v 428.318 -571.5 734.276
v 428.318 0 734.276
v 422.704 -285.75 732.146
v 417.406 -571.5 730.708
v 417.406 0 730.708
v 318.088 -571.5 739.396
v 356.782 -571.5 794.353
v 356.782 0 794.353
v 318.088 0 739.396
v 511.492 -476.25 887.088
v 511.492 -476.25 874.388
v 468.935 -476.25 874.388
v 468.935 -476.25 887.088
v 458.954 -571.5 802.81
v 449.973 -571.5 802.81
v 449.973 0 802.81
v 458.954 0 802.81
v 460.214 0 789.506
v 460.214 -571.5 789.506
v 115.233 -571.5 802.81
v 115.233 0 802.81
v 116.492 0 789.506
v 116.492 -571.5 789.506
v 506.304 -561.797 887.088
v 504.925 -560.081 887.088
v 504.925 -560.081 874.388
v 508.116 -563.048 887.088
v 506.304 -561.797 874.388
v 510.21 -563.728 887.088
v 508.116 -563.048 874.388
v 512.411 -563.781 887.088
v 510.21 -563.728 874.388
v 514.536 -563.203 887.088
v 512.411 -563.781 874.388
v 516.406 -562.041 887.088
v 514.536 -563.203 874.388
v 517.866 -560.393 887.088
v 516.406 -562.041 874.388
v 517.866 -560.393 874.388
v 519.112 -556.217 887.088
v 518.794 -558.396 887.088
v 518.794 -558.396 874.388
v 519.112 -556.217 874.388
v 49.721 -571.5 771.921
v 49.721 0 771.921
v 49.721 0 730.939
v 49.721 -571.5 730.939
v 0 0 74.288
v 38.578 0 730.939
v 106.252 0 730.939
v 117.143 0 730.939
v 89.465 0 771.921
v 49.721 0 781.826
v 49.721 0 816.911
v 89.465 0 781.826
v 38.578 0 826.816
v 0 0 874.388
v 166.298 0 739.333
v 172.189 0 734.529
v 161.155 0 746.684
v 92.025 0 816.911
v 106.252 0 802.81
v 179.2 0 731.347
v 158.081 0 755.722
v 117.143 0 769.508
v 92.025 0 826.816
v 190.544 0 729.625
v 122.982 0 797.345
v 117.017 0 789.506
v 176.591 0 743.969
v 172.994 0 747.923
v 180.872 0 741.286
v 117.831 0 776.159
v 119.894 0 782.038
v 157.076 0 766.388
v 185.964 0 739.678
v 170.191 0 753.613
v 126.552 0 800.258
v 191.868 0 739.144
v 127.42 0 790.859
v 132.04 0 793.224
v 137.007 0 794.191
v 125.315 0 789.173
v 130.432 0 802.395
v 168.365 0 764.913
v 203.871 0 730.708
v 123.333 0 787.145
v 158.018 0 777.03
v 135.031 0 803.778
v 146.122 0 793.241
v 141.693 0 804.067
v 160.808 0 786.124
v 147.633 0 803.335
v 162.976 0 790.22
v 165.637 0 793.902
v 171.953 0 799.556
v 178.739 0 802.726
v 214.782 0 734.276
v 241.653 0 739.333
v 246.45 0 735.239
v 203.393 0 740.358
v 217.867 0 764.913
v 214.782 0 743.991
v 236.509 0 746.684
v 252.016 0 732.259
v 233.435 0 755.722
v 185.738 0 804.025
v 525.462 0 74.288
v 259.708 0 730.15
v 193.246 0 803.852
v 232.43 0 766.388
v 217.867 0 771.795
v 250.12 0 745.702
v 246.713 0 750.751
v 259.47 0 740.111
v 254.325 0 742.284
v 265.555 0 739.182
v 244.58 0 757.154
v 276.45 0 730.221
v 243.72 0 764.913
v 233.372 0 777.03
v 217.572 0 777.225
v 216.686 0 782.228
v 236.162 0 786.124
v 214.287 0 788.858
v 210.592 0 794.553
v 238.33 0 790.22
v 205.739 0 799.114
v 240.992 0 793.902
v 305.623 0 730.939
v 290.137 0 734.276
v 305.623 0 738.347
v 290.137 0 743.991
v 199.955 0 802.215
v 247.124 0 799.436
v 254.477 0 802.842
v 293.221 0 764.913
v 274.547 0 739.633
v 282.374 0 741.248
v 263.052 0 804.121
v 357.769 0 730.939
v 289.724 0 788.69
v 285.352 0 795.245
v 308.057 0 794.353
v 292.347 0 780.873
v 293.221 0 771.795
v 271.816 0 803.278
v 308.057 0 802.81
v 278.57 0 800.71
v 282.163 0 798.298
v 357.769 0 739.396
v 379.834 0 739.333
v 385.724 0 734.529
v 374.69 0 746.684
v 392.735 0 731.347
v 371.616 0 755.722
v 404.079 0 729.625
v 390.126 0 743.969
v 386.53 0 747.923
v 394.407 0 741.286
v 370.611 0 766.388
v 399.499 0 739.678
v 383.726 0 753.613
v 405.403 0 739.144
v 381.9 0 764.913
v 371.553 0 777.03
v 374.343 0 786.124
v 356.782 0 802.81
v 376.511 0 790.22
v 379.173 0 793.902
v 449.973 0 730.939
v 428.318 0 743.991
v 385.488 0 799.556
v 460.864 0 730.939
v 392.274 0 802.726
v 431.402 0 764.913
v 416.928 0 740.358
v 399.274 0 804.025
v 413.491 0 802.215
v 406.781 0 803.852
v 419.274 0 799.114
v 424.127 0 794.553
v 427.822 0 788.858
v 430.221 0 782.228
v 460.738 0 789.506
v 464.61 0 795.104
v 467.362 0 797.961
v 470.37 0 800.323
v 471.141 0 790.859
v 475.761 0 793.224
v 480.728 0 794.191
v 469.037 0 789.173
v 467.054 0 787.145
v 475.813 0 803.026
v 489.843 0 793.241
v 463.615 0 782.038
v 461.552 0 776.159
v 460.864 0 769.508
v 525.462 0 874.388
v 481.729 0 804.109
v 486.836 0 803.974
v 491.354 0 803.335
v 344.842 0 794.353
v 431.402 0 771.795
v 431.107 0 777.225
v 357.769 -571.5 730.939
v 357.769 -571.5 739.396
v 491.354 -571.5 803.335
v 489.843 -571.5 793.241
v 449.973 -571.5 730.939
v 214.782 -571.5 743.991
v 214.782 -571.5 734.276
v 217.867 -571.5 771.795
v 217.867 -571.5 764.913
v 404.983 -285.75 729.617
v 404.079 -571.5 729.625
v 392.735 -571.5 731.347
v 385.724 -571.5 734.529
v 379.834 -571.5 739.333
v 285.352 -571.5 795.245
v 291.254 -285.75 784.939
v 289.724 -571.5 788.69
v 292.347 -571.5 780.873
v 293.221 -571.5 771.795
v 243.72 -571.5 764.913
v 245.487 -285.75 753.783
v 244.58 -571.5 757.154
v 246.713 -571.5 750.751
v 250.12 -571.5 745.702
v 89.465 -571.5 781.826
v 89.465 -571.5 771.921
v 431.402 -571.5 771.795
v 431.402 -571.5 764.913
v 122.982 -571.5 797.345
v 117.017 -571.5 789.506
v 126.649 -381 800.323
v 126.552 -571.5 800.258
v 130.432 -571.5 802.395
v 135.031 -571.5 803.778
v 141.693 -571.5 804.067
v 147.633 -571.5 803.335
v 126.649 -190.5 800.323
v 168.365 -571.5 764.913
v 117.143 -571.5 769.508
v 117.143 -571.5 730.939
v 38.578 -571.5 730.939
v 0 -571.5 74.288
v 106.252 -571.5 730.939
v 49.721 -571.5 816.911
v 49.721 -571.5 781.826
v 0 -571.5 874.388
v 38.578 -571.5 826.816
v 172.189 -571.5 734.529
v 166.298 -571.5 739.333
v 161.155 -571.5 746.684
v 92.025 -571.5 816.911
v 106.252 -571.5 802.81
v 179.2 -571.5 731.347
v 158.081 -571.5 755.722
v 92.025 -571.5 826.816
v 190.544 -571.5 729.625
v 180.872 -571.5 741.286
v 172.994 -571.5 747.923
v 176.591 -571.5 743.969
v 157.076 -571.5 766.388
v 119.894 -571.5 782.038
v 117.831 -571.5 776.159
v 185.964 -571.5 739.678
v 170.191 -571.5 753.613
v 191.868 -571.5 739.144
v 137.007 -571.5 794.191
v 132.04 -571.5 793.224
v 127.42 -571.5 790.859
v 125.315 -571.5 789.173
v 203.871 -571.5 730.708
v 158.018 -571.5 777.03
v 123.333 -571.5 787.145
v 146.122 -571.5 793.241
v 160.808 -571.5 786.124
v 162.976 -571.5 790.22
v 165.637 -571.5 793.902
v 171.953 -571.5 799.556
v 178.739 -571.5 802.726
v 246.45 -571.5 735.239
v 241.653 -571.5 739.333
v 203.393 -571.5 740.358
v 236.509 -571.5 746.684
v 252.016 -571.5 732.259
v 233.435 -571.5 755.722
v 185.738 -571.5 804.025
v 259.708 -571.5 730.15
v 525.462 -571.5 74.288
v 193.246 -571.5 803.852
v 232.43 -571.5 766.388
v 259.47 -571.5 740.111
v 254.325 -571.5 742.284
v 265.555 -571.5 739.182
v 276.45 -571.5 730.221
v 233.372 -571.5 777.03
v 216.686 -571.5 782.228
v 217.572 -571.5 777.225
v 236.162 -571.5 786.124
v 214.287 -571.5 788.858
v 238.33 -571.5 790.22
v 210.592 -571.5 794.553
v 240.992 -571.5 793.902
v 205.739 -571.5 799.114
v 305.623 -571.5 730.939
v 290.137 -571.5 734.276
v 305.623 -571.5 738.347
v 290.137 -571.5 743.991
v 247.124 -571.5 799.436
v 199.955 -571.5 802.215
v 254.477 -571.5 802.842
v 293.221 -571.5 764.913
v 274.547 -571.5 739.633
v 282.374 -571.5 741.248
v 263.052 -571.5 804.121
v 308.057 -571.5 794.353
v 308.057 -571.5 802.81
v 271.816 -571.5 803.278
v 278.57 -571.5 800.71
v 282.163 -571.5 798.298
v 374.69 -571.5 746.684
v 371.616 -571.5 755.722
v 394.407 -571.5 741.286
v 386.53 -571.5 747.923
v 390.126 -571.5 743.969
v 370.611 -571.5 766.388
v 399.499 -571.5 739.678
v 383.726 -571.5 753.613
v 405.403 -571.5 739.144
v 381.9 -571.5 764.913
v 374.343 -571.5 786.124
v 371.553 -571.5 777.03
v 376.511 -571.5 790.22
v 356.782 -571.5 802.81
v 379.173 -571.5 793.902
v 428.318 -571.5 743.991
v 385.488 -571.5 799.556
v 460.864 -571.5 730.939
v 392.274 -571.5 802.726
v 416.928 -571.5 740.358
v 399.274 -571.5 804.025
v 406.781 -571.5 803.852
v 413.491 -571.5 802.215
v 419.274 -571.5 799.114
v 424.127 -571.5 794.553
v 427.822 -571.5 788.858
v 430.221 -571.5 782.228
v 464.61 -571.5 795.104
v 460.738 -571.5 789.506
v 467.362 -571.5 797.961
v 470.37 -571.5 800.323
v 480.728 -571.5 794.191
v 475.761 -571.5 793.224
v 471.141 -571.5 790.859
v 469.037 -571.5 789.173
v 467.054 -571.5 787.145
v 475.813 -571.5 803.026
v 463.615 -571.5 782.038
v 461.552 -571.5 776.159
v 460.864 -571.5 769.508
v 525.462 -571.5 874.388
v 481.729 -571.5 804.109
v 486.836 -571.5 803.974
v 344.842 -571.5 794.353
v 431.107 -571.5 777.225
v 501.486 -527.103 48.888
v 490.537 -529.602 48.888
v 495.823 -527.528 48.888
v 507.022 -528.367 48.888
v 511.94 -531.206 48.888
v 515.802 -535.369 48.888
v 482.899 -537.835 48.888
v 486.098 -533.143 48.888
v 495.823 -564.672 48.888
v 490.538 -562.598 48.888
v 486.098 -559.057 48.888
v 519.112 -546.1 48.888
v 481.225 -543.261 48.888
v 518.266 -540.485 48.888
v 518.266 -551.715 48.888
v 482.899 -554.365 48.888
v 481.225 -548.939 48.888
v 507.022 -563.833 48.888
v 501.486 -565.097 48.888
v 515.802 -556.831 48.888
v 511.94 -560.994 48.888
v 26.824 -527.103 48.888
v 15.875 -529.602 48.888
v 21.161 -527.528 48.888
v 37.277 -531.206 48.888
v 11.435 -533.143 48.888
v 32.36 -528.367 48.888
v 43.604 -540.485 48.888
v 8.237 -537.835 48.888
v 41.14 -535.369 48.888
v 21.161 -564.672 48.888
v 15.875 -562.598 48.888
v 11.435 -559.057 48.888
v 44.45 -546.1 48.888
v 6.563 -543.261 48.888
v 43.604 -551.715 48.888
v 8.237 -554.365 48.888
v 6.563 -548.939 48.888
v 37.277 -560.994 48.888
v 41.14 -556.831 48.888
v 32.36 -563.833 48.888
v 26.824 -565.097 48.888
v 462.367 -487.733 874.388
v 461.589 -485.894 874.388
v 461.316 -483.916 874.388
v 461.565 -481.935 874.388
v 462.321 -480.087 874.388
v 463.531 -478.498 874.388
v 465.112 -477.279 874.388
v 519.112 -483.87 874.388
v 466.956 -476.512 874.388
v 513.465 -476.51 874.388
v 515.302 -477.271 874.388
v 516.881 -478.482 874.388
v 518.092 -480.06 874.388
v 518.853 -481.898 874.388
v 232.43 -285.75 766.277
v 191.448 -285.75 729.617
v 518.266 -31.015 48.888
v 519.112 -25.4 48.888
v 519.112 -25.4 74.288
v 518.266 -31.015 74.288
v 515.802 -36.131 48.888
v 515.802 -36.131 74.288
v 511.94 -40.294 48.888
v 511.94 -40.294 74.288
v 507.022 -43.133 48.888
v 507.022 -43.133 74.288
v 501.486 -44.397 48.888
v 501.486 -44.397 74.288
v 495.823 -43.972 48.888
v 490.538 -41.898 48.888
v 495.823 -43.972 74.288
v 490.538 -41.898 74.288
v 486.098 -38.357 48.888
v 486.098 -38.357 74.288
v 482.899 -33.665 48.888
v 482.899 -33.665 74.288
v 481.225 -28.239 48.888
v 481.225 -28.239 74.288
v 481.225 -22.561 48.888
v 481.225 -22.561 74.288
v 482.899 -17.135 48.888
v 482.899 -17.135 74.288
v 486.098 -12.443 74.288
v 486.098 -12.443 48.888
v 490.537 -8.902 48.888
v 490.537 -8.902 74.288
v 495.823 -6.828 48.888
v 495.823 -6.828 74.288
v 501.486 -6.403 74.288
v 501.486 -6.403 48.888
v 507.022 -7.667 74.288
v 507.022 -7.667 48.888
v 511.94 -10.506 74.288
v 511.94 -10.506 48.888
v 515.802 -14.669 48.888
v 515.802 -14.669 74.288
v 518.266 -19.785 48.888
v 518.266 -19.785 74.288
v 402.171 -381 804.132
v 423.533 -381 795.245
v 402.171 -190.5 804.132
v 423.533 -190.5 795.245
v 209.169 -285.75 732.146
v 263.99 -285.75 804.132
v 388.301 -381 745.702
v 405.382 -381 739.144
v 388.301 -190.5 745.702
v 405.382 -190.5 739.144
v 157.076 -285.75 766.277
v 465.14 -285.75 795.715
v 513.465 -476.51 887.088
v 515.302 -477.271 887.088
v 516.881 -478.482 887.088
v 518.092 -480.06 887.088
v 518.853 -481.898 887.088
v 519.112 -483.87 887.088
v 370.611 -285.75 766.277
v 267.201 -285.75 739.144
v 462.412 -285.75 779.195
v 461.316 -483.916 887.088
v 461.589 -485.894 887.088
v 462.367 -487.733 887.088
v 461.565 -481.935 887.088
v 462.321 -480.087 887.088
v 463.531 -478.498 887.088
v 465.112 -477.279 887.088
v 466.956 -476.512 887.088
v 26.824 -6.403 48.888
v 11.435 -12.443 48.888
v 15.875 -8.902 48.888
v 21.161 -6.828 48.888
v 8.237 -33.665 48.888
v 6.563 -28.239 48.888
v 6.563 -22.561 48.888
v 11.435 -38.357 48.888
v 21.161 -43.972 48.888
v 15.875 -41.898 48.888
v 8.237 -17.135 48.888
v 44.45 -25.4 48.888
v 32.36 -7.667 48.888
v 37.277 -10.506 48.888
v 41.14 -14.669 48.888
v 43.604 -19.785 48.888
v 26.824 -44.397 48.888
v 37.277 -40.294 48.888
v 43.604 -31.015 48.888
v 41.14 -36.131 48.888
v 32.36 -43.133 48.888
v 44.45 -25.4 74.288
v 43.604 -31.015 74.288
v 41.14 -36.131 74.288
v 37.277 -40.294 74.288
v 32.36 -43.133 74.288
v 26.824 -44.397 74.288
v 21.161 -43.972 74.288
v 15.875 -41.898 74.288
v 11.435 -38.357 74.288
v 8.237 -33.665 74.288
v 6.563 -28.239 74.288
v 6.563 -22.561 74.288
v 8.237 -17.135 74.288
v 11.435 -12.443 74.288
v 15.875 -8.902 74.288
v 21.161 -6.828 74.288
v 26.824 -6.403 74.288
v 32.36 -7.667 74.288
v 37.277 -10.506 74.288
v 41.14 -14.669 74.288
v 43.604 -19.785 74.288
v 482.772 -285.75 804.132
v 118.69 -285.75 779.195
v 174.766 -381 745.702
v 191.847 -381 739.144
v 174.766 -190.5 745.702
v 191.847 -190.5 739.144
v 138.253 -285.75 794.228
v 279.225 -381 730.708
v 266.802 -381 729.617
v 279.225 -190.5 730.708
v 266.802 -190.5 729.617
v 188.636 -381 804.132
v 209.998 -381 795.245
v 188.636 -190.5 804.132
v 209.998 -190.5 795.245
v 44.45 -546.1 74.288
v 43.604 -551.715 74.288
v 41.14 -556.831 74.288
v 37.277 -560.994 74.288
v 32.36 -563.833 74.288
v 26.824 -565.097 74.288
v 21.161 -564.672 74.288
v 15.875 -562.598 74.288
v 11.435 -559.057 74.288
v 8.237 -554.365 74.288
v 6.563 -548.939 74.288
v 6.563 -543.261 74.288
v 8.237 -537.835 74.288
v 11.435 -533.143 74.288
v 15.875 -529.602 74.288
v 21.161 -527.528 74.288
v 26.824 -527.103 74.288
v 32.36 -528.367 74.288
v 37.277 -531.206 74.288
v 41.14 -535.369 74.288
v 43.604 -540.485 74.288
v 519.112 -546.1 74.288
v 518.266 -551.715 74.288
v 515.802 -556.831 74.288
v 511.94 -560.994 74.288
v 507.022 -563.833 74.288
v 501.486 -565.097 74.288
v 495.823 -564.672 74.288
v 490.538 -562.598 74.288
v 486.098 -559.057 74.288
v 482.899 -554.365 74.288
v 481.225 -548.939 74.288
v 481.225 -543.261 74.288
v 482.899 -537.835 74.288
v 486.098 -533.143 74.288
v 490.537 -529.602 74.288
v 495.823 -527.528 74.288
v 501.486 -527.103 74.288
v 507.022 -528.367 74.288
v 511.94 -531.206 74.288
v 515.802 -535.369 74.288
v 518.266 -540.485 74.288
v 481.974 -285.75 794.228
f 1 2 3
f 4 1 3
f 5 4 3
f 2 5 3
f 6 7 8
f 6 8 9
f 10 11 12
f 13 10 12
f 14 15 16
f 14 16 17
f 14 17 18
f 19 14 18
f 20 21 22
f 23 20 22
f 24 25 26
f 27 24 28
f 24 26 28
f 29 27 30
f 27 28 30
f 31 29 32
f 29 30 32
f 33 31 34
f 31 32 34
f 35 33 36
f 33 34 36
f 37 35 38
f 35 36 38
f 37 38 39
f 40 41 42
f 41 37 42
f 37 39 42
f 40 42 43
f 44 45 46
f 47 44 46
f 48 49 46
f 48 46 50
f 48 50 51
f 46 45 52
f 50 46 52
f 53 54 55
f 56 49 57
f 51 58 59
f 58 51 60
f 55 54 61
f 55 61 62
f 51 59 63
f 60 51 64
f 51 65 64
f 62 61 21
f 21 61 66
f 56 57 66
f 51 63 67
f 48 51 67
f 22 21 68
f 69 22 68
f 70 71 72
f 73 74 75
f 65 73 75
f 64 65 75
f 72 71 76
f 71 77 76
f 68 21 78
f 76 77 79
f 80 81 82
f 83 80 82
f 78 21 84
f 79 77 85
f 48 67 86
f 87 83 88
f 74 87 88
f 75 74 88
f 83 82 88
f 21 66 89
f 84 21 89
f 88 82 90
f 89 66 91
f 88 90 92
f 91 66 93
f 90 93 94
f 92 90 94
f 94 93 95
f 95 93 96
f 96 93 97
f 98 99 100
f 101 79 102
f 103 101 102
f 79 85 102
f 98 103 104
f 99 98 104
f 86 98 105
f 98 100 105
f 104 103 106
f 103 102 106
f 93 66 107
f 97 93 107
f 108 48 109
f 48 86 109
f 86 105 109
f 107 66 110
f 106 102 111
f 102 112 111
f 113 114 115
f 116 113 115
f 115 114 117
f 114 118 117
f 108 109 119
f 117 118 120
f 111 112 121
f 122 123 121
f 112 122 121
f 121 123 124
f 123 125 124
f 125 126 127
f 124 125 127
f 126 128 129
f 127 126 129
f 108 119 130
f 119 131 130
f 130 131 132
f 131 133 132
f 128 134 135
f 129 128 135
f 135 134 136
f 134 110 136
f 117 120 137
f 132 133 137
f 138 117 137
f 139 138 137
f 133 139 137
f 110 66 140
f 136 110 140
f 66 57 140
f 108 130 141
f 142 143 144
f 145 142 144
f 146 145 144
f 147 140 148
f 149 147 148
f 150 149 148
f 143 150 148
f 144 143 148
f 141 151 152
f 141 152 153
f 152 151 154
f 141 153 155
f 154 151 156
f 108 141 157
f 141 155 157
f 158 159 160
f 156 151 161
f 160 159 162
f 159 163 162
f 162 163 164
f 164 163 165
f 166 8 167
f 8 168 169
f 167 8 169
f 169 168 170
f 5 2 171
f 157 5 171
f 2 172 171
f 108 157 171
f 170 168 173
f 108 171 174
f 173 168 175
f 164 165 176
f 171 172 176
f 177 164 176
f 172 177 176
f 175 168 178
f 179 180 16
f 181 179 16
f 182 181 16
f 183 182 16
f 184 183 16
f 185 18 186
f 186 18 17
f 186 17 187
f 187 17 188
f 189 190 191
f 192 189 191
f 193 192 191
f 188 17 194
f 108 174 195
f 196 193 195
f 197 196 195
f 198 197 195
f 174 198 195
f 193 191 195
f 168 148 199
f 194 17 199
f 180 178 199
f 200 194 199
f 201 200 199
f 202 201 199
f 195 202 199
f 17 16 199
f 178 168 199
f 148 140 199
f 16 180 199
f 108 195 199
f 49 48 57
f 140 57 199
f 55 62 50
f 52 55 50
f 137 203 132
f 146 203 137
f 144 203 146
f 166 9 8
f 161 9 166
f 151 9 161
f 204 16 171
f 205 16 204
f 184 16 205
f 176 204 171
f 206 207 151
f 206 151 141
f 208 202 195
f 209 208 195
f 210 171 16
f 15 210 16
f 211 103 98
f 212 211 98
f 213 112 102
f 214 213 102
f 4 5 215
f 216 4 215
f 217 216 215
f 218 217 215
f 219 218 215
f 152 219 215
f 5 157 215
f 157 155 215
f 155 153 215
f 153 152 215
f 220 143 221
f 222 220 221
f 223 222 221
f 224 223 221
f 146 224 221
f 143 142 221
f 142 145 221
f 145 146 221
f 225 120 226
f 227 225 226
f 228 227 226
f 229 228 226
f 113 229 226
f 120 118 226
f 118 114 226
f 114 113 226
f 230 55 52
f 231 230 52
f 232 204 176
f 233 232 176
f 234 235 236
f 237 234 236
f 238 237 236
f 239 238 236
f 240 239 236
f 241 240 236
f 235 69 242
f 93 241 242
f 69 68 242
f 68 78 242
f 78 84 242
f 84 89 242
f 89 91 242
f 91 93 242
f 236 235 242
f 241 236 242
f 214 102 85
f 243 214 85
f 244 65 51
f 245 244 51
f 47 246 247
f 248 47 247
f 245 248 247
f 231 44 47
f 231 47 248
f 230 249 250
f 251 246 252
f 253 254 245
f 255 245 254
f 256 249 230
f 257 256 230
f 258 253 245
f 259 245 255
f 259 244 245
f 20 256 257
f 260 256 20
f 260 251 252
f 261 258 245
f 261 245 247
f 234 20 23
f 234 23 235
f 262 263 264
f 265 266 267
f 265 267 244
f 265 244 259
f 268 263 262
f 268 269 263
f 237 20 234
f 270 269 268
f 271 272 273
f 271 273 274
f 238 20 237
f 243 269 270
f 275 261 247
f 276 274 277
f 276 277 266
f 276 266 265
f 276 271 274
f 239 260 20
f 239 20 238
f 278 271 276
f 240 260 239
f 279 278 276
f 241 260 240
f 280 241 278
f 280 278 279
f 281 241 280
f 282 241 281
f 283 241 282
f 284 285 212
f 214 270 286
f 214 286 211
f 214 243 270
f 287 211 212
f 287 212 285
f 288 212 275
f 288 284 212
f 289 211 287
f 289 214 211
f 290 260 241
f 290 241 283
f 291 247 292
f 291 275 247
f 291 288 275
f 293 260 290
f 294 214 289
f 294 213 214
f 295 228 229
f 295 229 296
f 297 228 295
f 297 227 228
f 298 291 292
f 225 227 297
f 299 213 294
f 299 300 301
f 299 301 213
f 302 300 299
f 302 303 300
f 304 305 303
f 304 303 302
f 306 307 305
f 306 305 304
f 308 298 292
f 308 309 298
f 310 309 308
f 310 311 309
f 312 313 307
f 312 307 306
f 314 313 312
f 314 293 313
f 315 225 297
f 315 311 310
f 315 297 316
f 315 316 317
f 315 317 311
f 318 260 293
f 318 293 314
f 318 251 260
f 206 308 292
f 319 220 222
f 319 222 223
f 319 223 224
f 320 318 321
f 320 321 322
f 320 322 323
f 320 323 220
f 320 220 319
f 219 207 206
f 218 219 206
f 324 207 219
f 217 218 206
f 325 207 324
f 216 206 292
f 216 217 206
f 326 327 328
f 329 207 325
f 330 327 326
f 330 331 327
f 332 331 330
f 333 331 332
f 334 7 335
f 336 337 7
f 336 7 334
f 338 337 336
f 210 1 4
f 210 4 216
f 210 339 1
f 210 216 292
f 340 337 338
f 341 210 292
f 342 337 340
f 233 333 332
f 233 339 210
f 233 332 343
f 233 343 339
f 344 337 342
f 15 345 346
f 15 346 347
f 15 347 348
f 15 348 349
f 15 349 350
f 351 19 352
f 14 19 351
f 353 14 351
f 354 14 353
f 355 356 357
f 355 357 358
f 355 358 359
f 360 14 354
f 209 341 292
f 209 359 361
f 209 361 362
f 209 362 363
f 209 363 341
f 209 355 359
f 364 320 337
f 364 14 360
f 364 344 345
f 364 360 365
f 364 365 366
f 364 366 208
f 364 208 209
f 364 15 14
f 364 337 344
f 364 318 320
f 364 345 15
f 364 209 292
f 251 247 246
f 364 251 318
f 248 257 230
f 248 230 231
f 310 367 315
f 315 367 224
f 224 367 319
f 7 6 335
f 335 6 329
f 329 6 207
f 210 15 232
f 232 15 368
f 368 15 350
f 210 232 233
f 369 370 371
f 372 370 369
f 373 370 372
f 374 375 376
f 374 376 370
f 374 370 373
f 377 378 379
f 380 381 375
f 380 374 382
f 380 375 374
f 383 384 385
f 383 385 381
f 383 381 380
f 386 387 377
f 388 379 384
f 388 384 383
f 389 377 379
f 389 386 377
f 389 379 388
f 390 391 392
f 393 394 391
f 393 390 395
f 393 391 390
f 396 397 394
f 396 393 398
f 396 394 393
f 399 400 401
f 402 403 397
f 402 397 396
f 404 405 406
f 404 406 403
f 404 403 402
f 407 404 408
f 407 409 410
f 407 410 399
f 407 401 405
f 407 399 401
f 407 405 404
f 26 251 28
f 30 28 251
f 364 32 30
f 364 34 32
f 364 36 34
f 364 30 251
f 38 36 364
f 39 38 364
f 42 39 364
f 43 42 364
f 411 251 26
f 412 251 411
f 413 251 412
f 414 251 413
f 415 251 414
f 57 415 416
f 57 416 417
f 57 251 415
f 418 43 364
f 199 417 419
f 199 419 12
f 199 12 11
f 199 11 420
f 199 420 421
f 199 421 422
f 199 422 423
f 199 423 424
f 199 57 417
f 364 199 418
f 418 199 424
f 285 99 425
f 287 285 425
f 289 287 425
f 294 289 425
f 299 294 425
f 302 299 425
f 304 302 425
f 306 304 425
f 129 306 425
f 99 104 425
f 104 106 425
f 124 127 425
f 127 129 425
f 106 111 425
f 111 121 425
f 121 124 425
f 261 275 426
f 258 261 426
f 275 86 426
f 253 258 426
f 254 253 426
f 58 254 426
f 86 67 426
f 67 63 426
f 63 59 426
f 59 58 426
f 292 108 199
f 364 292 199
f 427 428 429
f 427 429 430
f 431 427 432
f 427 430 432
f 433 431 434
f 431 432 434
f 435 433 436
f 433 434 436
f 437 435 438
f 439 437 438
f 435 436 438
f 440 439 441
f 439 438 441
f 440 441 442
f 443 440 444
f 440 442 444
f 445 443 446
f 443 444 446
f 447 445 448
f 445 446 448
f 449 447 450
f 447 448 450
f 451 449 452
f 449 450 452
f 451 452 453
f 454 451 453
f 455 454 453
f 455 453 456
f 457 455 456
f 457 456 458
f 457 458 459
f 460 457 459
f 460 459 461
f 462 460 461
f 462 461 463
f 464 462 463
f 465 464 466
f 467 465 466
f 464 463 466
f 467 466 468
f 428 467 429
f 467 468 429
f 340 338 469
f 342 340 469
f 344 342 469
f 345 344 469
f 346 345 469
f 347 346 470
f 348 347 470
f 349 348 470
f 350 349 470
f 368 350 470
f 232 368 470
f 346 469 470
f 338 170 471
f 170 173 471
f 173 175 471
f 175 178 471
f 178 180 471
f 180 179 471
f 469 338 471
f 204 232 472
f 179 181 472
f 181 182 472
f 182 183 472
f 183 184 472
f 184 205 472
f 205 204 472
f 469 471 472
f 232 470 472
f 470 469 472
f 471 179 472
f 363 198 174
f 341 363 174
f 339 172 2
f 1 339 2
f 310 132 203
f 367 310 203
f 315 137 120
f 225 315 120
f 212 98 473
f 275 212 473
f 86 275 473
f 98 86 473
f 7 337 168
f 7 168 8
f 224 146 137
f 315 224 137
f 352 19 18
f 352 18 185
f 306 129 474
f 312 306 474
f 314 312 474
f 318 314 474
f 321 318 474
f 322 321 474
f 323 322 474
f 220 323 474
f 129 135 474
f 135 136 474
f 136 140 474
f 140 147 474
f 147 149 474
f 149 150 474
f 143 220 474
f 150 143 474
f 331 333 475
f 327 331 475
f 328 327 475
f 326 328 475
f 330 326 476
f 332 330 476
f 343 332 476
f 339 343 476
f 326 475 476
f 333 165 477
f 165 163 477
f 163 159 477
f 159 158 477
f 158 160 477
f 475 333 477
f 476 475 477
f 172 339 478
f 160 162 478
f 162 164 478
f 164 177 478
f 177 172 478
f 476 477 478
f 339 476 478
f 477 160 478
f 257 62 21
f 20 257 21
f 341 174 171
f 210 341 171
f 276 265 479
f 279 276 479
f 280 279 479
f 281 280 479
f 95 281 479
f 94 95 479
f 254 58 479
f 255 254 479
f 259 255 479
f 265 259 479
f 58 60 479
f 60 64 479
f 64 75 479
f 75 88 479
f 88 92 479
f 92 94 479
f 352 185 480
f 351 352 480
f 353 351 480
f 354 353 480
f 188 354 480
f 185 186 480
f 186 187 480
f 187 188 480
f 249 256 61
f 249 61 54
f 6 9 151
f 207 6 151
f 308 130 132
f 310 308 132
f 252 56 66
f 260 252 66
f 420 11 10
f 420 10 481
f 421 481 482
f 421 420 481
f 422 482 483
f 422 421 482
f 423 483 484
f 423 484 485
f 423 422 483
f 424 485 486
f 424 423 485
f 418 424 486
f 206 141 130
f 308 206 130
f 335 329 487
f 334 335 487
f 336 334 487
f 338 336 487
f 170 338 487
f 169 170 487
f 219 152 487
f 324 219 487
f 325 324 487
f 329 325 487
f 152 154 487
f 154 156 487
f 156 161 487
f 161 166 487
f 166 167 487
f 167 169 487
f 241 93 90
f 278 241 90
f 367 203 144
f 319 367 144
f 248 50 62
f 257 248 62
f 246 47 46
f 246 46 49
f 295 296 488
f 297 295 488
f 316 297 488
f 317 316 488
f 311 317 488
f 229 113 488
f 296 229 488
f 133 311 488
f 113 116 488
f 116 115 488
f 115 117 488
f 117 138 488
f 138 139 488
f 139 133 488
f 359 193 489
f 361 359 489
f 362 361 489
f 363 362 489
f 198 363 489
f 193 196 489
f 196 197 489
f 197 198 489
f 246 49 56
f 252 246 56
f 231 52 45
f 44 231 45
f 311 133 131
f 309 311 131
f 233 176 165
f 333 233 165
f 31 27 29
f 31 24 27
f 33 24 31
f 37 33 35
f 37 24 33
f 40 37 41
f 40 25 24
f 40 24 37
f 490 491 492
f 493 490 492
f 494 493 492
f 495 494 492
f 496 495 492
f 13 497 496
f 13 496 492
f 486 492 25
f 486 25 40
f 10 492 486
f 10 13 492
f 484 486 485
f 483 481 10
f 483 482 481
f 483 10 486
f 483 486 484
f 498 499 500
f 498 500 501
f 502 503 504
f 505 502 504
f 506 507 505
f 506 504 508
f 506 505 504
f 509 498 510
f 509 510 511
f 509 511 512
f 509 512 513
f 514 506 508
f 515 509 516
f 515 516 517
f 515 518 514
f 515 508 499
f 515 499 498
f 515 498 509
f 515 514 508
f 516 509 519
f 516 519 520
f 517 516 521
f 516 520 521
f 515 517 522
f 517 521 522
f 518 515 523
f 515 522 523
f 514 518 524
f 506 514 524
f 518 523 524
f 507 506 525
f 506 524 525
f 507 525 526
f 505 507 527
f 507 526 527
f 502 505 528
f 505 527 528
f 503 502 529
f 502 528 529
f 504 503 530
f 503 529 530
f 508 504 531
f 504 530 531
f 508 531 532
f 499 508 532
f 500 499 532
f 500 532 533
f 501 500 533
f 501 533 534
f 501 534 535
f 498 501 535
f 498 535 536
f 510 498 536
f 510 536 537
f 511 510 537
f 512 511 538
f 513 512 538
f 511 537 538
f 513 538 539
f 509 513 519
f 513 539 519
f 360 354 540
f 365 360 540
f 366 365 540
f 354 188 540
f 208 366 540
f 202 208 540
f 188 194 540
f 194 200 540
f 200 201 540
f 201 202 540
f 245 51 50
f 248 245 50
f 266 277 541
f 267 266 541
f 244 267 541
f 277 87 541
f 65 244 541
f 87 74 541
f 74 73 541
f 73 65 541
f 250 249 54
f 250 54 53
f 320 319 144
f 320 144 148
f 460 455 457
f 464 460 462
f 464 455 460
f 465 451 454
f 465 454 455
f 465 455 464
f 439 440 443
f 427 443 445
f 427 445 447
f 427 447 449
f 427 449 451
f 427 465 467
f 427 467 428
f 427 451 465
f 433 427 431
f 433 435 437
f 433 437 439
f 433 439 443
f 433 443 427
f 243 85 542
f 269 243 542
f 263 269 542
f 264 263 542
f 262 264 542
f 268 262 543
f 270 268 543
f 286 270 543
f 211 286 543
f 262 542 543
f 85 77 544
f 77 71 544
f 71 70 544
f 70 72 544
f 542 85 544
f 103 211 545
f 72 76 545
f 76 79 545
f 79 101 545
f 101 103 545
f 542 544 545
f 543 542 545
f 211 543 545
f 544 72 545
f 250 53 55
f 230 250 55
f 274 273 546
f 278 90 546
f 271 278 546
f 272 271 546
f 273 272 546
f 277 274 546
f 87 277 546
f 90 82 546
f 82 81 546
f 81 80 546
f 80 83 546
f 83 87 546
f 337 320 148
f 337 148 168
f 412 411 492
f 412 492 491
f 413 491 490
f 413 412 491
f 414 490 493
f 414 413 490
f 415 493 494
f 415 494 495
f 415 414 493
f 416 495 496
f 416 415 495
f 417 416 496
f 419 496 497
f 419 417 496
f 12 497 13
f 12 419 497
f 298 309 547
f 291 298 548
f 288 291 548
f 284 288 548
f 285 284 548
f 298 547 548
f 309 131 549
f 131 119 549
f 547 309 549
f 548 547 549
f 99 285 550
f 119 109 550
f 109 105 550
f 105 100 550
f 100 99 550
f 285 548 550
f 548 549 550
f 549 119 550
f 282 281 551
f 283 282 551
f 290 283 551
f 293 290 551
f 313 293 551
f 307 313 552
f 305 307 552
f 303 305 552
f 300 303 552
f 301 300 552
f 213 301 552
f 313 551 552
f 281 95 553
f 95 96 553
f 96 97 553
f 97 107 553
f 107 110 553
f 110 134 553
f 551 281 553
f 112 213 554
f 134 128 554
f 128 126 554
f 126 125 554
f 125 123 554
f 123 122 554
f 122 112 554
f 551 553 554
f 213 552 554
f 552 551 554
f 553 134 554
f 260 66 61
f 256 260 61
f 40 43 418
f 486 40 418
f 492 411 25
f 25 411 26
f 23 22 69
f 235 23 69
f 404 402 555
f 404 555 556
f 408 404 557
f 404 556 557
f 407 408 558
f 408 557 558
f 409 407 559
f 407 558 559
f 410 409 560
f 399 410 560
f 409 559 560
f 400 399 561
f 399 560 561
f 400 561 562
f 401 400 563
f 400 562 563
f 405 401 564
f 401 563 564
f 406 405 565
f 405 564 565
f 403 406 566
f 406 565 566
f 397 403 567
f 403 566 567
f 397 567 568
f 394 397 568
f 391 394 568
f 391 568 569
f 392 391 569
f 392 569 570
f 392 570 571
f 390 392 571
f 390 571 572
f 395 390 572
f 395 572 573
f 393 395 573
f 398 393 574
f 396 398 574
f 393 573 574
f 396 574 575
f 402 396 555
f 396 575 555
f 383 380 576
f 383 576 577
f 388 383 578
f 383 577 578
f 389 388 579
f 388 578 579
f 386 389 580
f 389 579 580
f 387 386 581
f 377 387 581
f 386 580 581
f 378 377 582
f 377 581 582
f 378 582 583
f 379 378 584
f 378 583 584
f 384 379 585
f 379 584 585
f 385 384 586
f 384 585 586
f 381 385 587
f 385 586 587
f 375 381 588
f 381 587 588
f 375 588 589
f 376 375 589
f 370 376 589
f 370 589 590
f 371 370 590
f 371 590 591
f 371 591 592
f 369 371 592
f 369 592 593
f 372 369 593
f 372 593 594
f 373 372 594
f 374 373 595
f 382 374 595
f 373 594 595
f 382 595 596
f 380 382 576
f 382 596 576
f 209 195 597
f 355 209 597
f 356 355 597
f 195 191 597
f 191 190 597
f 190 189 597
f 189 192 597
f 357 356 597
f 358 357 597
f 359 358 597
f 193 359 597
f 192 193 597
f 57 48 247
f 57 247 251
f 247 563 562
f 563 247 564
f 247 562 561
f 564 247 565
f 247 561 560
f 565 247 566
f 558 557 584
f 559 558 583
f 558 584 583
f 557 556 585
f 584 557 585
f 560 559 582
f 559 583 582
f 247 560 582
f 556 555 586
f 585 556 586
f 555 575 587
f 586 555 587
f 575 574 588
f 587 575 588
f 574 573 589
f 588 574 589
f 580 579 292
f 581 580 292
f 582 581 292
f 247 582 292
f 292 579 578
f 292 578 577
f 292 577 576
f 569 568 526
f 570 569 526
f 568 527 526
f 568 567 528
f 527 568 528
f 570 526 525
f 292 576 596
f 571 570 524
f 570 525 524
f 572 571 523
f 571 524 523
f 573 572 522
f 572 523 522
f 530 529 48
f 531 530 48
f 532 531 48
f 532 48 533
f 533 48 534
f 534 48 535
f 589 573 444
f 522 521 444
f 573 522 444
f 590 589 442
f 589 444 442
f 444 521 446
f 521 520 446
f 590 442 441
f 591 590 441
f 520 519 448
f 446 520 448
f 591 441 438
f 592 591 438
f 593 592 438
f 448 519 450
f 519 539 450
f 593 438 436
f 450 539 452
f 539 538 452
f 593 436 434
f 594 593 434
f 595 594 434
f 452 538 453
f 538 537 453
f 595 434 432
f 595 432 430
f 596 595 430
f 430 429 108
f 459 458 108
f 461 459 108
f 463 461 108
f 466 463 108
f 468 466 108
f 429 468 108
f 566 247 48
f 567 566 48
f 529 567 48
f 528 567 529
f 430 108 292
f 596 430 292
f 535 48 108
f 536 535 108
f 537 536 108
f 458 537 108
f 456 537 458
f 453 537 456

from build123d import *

# Parameters (mm, degrees)
F0_W        = 525.4625
F0_H        = 800.1
F1_DEPTH    = 571.5
F2_R        = 19.05
F3_DEPTH    = 25.4
F5_DEPTH    = 12.7
F6_T1_DEPTH = 82.6574729689
F6_T3_DEPTH = 31.75
F6_T5_DEPTH = 46.0073370405


# Not quite as in the source:
# - a fillet or chamfer that OpenCascade refuses, or shapes differently, is made with other operations: its cross-section is extruded or revolved along the edge and cut away or added


with BuildPart() as f1:
    # F0 (on Front) → F1 (new body)
    with BuildSketch(Plane.XZ):
        with Locations((262.73125, 474.3377777734)):
            Rectangle(F0_W, F0_H)
        with BuildLine():
            add(Edge.make_bspline(
                [(126.6487428161, 800.3234279035), (132.2934913793, 804.132059369), (139.0504022989, 804.132059369)],
                knots=[0, 0, 0, 1, 1, 1], degree=2))
            add(Edge.make_bspline(
                [(139.0504022989, 804.132059369), (143.8347988506, 804.132059369), (147.6329382184, 803.3346599437)],
                knots=[0, 0, 0, 1, 1, 1], degree=2))
            Line((147.6329382184, 803.3346599437), (146.1220761494, 793.2412619552))
            add(Edge.make_bspline(
                [(146.1220761494, 793.2412619552), (141.6734267241, 794.2275191391), (138.2530028736, 794.2275191391)],
                knots=[0, 0, 0, 1, 1, 1], degree=2))
            add(Edge.make_bspline(
                [(138.2530028736, 794.2275191391), (129.5235775862, 794.2275191391), (123.3332399425, 787.1453531909)],
                knots=[0, 0, 0, 1, 1, 1], degree=2))
            add(Edge.make_bspline(
                [(123.3332399425, 787.1453531909), (117.1429022989, 780.0631872426), (117.1429022989, 769.5081369552)],
                knots=[0, 0, 0, 1, 1, 1], degree=2))
            Line((117.1429022989, 769.5081369552), (117.1429022989, 730.9391858058))
            Line((117.1429022989, 730.9391858058), (106.2521048851, 730.9391858058))
            Line((106.2521048851, 730.9391858058), (106.2521048851, 802.8100550587))
            Line((106.2521048851, 802.8100550587), (115.2333405172, 802.8100550587))
            Line((115.2333405172, 802.8100550587), (116.4923922414, 789.5060751736))
            Line((116.4923922414, 789.5060751736), (117.0169971264, 789.5060751736))
            add(Edge.make_bspline(
                [(117.0169971264, 789.5060751736), (121.0039942529, 796.514796438), (126.6487428161, 800.3234279035)],
                knots=[0, 0, 0, 1, 1, 1], degree=2))
        make_face(mode=Mode.SUBTRACT)
        Polygon((49.7206824713, 771.9213194265), (49.7206824713, 730.9391858058), (38.5780747126, 730.9391858058), (38.5780747126, 826.8159745989), (92.0248204023, 826.8159745989), (92.0248204023, 816.911434369), (49.7206824713, 816.911434369), (49.7206824713, 781.8258596564), (89.4647485632, 781.8258596564), (89.4647485632, 771.9213194265), align=None, mode=Mode.SUBTRACT)
        with BuildLine():
            add(Edge.make_bspline(
                [(203.8705818966, 730.7083596564), (198.729454023, 729.6171814955), (191.4479382184, 729.6171814955)],
                knots=[0, 0, 0, 1, 1, 1], degree=2))
            add(Edge.make_bspline(
                [(191.4479382184, 729.6171814955), (175.520933908, 729.6171814955), (166.2983800287, 739.3328639667)],
                knots=[0, 0, 0, 1, 1, 1], degree=2))
            add(Edge.make_bspline(
                [(166.2983800287, 739.3328639667), (157.0758261494, 749.048546438), (157.0758261494, 766.2765708633)],
                knots=[0, 0, 0, 1, 1, 1], degree=2))
            add(Edge.make_bspline(
                [(157.0758261494, 766.2765708633), (157.0758261494, 783.6724688518), (165.6373778736, 793.9022641104)],
                knots=[0, 0, 0, 1, 1, 1], degree=2))
            add(Edge.make_bspline(
                [(165.6373778736, 793.9022641104), (174.1989295977, 804.132059369), (188.6360560345, 804.132059369)],
                knots=[0, 0, 0, 1, 1, 1], degree=2))
            add(Edge.make_bspline(
                [(188.6360560345, 804.132059369), (202.1288936782, 804.132059369), (209.997966954, 795.2452526162)],
                knots=[0, 0, 0, 1, 1, 1], degree=2))
            add(Edge.make_bspline(
                [(209.997966954, 795.2452526162), (217.8670402299, 786.3584458633), (217.8670402299, 771.7954142541)],
                knots=[0, 0, 0, 1, 1, 1], degree=2))
            Line((217.8670402299, 771.7954142541), (217.8670402299, 764.9125981621))
            Line((217.8670402299, 764.9125981621), (168.3653232759, 764.9125981621))
            add(Edge.make_bspline(
                [(168.3653232759, 764.9125981621), (168.7010704023, 752.2591283346), (174.7655028736, 745.7015672713)],
                knots=[0, 0, 0, 1, 1, 1], degree=2))
            add(Edge.make_bspline(
                [(174.7655028736, 745.7015672713), (180.8299353448, 739.1440062081), (191.846637931, 739.1440062081)],
                knots=[0, 0, 0, 1, 1, 1], degree=2))
            add(Edge.make_bspline(
                [(191.846637931, 739.1440062081), (203.4508979885, 739.1440062081), (214.7823635057, 743.991355346)],
                knots=[0, 0, 0, 1, 1, 1], degree=2))
            Line((214.7823635057, 743.991355346), (214.7823635057, 734.2756728748))
            add(Edge.make_bspline(
                [(214.7823635057, 734.2756728748), (209.0117097701, 731.7995378173), (203.8705818966, 730.7083596564)],
                knots=[0, 0, 0, 1, 1, 1], degree=2))
        make_face(mode=Mode.SUBTRACT)
        with BuildLine():
            add(Edge.make_bspline(
                [(279.2248275862, 730.7083596564), (274.0836997126, 729.6171814955), (266.802183908, 729.6171814955)],
                knots=[0, 0, 0, 1, 1, 1], degree=2))
            add(Edge.make_bspline(
                [(266.802183908, 729.6171814955), (250.8751795977, 729.6171814955), (241.6526257184, 739.3328639667)],
                knots=[0, 0, 0, 1, 1, 1], degree=2))
            add(Edge.make_bspline(
                [(241.6526257184, 739.3328639667), (232.4300718391, 749.048546438), (232.4300718391, 766.2765708633)],
                knots=[0, 0, 0, 1, 1, 1], degree=2))
            add(Edge.make_bspline(
                [(232.4300718391, 766.2765708633), (232.4300718391, 783.6724688518), (240.9916235632, 793.9022641104)],
                knots=[0, 0, 0, 1, 1, 1], degree=2))
            add(Edge.make_bspline(
                [(240.9916235632, 793.9022641104), (249.5531752874, 804.132059369), (263.9903017241, 804.132059369)],
                knots=[0, 0, 0, 1, 1, 1], degree=2))
            add(Edge.make_bspline(
                [(263.9903017241, 804.132059369), (277.4831393678, 804.132059369), (285.3522126437, 795.2452526162)],
                knots=[0, 0, 0, 1, 1, 1], degree=2))
            add(Edge.make_bspline(
                [(285.3522126437, 795.2452526162), (293.2212859195, 786.3584458633), (293.2212859195, 771.7954142541)],
                knots=[0, 0, 0, 1, 1, 1], degree=2))
            Line((293.2212859195, 771.7954142541), (293.2212859195, 764.9125981621))
            Line((293.2212859195, 764.9125981621), (243.7195689655, 764.9125981621))
            add(Edge.make_bspline(
                [(243.7195689655, 764.9125981621), (244.055316092, 752.2591283346), (250.1197485632, 745.7015672713)],
                knots=[0, 0, 0, 1, 1, 1], degree=2))
            add(Edge.make_bspline(
                [(250.1197485632, 745.7015672713), (256.1841810345, 739.1440062081), (267.2008836207, 739.1440062081)],
                knots=[0, 0, 0, 1, 1, 1], degree=2))
            add(Edge.make_bspline(
                [(267.2008836207, 739.1440062081), (278.8051436782, 739.1440062081), (290.1366091954, 743.991355346)],
                knots=[0, 0, 0, 1, 1, 1], degree=2))
            Line((290.1366091954, 743.991355346), (290.1366091954, 734.2756728748))
            add(Edge.make_bspline(
                [(290.1366091954, 734.2756728748), (284.3659554598, 731.7995378173), (279.2248275862, 730.7083596564)],
                knots=[0, 0, 0, 1, 1, 1], degree=2))
        make_face(mode=Mode.SUBTRACT)
        Polygon((357.768670977, 739.3958165529), (357.768670977, 730.9391858058), (305.6229454023, 730.9391858058), (305.6229454023, 738.3466067828), (344.8424066092, 794.3534243116), (308.057112069, 794.3534243116), (308.057112069, 802.8100550587), (356.7824137931, 802.8100550587), (356.7824137931, 794.3534243116), (318.0875574713, 739.3958165529), align=None, mode=Mode.SUBTRACT)
        with BuildLine():
            add(Edge.make_bspline(
                [(417.4057543103, 730.7083596564), (412.2646264368, 729.6171814955), (404.9831106322, 729.6171814955)],
                knots=[0, 0, 0, 1, 1, 1], degree=2))
            add(Edge.make_bspline(
                [(404.9831106322, 729.6171814955), (389.0561063218, 729.6171814955), (379.8335524425, 739.3328639667)],
                knots=[0, 0, 0, 1, 1, 1], degree=2))
            add(Edge.make_bspline(
                [(379.8335524425, 739.3328639667), (370.6109985632, 749.048546438), (370.6109985632, 766.2765708633)],
                knots=[0, 0, 0, 1, 1, 1], degree=2))
            add(Edge.make_bspline(
                [(370.6109985632, 766.2765708633), (370.6109985632, 783.6724688518), (379.1725502874, 793.9022641104)],
                knots=[0, 0, 0, 1, 1, 1], degree=2))
            add(Edge.make_bspline(
                [(379.1725502874, 793.9022641104), (387.7341020115, 804.132059369), (402.1712284483, 804.132059369)],
                knots=[0, 0, 0, 1, 1, 1], degree=2))
            add(Edge.make_bspline(
                [(402.1712284483, 804.132059369), (415.664066092, 804.132059369), (423.5331393678, 795.2452526162)],
                knots=[0, 0, 0, 1, 1, 1], degree=2))
            add(Edge.make_bspline(
                [(423.5331393678, 795.2452526162), (431.4022126437, 786.3584458633), (431.4022126437, 771.7954142541)],
                knots=[0, 0, 0, 1, 1, 1], degree=2))
            Line((431.4022126437, 771.7954142541), (431.4022126437, 764.9125981621))
            Line((431.4022126437, 764.9125981621), (381.9004956897, 764.9125981621))
            add(Edge.make_bspline(
                [(381.9004956897, 764.9125981621), (382.2362428161, 752.2591283346), (388.3006752874, 745.7015672713)],
                knots=[0, 0, 0, 1, 1, 1], degree=2))
            add(Edge.make_bspline(
                [(388.3006752874, 745.7015672713), (394.3651077586, 739.1440062081), (405.3818103448, 739.1440062081)],
                knots=[0, 0, 0, 1, 1, 1], degree=2))
            add(Edge.make_bspline(
                [(405.3818103448, 739.1440062081), (416.9860704023, 739.1440062081), (428.3175359195, 743.991355346)],
                knots=[0, 0, 0, 1, 1, 1], degree=2))
            Line((428.3175359195, 743.991355346), (428.3175359195, 734.2756728748))
            add(Edge.make_bspline(
                [(428.3175359195, 734.2756728748), (422.5468821839, 731.7995378173), (417.4057543103, 730.7083596564)],
                knots=[0, 0, 0, 1, 1, 1], degree=2))
        make_face(mode=Mode.SUBTRACT)
        with BuildLine():
            add(Edge.make_bspline(
                [(470.3698635057, 800.3234279035), (476.014612069, 804.132059369), (482.7715229885, 804.132059369)],
                knots=[0, 0, 0, 1, 1, 1], degree=2))
            add(Edge.make_bspline(
                [(482.7715229885, 804.132059369), (487.5559195402, 804.132059369), (491.354058908, 803.3346599437)],
                knots=[0, 0, 0, 1, 1, 1], degree=2))
            Line((491.354058908, 803.3346599437), (489.8431968391, 793.2412619552))
            add(Edge.make_bspline(
                [(489.8431968391, 793.2412619552), (485.3945474138, 794.2275191391), (481.9741235632, 794.2275191391)],
                knots=[0, 0, 0, 1, 1, 1], degree=2))
            add(Edge.make_bspline(
                [(481.9741235632, 794.2275191391), (473.2446982759, 794.2275191391), (467.0543606322, 787.1453531909)],
                knots=[0, 0, 0, 1, 1, 1], degree=2))
            add(Edge.make_bspline(
                [(467.0543606322, 787.1453531909), (460.8640229885, 780.0631872426), (460.8640229885, 769.5081369552)],
                knots=[0, 0, 0, 1, 1, 1], degree=2))
            Line((460.8640229885, 769.5081369552), (460.8640229885, 730.9391858058))
            Line((460.8640229885, 730.9391858058), (449.9732255747, 730.9391858058))
            Line((449.9732255747, 730.9391858058), (449.9732255747, 802.8100550587))
            Line((449.9732255747, 802.8100550587), (458.9544612069, 802.8100550587))
            Line((458.9544612069, 802.8100550587), (460.213512931, 789.5060751736))
            Line((460.213512931, 789.5060751736), (460.7381178161, 789.5060751736))
            add(Edge.make_bspline(
                [(460.7381178161, 789.5060751736), (464.7251149425, 796.514796438), (470.3698635057, 800.3234279035)],
                knots=[0, 0, 0, 1, 1, 1], degree=2))
        make_face(mode=Mode.SUBTRACT)
    extrude(amount=F1_DEPTH)

    # F2 (on face) → F3 (join)
    with BuildSketch(Plane(origin=(0, 0, 74.2877777734), x_dir=(1, 0, 0), z_dir=(0, 0, -1))):
        with Locations((25.4, 25.4)):
            Circle(F2_R)
        with Locations((25.4, 546.1)):
            Circle(F2_R)
        with Locations((500.0625, 546.1)):
            Circle(F2_R)
        with Locations((500.0625, 25.4)):
            Circle(F2_R)
    extrude(amount=F3_DEPTH)

    # F4 (on face) → F5 (join)
    with BuildSketch(Plane.XY.offset(874.3877777734)):
        Polygon((519.1125, -476.25), (455.6125, -476.25), (519.1125, -584.2), align=None)
    extrude(amount=F5_DEPTH)

    # F6: fillet of radius 7.62 on 3 edges, made by hand

    # F6_s2 → F6_t1 (cut)
    with BuildSketch(Plane.XY.offset(874.3877777734)):
        with BuildLine():
            ThreePointArc((504.9245612805, -560.0805041768), (513.4945872805, -563.5692925345), (519.1125, -556.2170108124))
            Line((519.1125, -556.2170108124), (519.1125, -584.2))
            Line((519.1125, -584.2), (504.9245612805, -560.0805041768))
        make_face()
    extrude(amount=F6_T1_DEPTH, mode=Mode.SUBTRACT)

    # F6_s4 → F6_t3 (cut)
    with BuildSketch(Plane.XY.offset(874.3877777734)):
        with BuildLine():
            ThreePointArc((511.4925, -476.25), (516.8806536726, -478.4818463274), (519.1125, -483.87))
            Line((519.1125, -483.87), (519.1125, -476.25))
            Line((519.1125, -476.25), (511.4925, -476.25))
        make_face()
    extrude(amount=F6_T3_DEPTH, mode=Mode.SUBTRACT)

    # F6_s6 → F6_t5 (cut)
    with BuildSketch(Plane.XY.offset(874.3877777734)):
        with BuildLine():
            ThreePointArc((462.3674960967, -487.7334933644), (462.3208970608, -480.0868412297), (468.9354348162, -476.25))
            Line((468.9354348162, -476.25), (455.6125, -476.25))
            Line((455.6125, -476.25), (462.3674960967, -487.7334933644))
        make_face()
    extrude(amount=F6_T5_DEPTH, mode=Mode.SUBTRACT)


solid = f1.part
